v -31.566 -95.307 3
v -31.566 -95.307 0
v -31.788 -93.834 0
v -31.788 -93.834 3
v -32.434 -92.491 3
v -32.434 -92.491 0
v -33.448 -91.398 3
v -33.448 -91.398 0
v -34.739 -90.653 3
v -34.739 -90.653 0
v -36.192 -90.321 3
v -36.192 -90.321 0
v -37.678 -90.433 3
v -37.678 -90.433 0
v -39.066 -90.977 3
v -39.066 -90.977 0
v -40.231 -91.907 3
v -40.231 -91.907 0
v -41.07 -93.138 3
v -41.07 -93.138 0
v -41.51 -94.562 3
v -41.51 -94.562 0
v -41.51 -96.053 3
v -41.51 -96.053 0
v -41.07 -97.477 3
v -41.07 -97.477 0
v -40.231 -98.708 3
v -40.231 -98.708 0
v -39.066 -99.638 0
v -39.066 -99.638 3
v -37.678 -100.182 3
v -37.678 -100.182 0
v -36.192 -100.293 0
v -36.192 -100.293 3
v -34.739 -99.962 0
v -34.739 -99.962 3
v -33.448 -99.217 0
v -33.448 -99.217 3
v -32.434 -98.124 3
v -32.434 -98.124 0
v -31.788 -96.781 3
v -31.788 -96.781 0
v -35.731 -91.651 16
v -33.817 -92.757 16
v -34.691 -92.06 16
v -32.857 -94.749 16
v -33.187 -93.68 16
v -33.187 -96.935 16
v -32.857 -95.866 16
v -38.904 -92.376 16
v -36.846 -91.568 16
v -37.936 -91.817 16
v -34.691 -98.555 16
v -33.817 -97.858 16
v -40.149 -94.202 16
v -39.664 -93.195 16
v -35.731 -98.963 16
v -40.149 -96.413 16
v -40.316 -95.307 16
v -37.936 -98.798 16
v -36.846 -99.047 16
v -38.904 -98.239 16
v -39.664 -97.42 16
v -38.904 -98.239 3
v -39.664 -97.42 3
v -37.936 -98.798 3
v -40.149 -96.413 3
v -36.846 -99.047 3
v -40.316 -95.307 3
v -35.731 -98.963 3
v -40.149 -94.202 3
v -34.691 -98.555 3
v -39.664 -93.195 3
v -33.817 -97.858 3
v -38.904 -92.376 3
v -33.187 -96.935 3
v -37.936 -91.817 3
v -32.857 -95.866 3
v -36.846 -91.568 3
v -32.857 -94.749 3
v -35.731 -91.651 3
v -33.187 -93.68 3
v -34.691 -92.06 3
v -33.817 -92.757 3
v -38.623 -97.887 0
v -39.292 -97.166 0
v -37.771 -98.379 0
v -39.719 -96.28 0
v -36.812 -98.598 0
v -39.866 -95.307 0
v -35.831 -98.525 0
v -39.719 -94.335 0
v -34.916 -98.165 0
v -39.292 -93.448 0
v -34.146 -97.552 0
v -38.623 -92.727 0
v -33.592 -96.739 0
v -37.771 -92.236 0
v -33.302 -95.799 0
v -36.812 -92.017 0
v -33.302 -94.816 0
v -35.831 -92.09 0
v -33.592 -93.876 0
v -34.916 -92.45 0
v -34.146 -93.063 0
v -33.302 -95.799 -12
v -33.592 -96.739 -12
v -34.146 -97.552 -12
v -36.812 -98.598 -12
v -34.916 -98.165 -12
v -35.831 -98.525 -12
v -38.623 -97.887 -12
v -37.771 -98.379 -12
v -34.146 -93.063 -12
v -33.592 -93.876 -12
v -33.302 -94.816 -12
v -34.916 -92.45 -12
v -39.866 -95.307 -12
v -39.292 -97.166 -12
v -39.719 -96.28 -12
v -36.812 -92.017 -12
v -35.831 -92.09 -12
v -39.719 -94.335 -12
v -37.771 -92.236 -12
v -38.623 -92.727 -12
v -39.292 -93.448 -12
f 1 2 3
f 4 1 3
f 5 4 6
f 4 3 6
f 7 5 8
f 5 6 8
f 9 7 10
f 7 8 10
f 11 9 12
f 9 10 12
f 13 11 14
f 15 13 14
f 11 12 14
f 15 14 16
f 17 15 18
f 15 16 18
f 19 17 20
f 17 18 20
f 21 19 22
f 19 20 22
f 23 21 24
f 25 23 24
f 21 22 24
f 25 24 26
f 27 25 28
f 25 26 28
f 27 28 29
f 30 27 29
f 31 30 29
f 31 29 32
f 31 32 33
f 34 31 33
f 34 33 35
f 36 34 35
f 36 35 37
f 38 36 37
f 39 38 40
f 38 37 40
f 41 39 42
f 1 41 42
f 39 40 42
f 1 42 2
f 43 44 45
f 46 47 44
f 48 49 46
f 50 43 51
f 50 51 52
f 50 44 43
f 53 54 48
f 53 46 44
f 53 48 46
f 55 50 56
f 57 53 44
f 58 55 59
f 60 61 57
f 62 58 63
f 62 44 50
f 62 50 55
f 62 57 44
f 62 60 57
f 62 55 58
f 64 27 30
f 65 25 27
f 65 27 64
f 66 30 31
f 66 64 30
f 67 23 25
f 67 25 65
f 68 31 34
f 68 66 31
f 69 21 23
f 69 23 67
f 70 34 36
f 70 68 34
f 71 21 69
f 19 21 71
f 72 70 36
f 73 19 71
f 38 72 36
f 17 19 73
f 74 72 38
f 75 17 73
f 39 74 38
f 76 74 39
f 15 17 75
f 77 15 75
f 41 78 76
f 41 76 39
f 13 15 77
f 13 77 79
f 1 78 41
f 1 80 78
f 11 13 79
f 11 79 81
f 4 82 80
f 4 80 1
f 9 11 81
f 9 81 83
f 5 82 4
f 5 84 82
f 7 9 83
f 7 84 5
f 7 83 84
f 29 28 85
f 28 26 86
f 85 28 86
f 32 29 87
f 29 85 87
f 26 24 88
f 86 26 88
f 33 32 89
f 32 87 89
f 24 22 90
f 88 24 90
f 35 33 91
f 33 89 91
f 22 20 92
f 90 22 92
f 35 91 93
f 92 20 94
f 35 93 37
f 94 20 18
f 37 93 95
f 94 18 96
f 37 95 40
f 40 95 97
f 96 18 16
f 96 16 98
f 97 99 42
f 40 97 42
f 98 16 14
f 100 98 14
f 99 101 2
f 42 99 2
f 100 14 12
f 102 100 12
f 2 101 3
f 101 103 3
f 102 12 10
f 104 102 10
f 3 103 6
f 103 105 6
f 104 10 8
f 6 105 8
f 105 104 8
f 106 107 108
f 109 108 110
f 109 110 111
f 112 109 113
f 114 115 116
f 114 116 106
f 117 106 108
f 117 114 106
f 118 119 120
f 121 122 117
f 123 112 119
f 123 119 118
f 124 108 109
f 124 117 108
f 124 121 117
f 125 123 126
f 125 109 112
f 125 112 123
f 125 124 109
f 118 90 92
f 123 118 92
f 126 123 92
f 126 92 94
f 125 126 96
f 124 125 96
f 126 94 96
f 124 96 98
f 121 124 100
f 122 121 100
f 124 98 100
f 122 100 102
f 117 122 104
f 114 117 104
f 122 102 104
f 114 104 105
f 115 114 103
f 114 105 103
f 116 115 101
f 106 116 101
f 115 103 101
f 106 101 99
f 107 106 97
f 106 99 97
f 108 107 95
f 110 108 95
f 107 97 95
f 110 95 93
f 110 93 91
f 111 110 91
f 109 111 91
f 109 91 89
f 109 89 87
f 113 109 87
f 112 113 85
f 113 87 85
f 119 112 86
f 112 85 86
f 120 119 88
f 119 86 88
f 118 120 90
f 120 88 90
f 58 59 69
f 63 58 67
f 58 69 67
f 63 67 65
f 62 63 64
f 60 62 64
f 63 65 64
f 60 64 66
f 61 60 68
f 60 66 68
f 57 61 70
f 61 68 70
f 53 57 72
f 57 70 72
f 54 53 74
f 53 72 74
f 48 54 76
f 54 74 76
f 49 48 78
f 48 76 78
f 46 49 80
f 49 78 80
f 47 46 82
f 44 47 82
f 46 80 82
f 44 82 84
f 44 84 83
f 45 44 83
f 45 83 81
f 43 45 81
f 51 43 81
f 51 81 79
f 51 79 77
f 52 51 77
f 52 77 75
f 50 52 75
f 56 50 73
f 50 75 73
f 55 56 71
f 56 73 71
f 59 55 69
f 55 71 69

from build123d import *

# Parameters (mm, degrees)
SKETCH_1_R      = 5
EXTRUDE_1_DEPTH = 3
SKETCH_2_R      = 3.3
EXTRUDE_2_DEPTH = 12
SKETCH_4_R      = 3.75
EXTRUDE_3_DEPTH = 13


with BuildPart() as part:
    # 草圖1 → 填料-伸長1 (new body)
    with BuildSketch(Plane.XY):
        with Locations((-36.565519845, -95.307444045)):
            Circle(SKETCH_1_R)
    extrude(amount=EXTRUDE_1_DEPTH)

    # 草圖2 → 填料-伸長2 (add)
    with BuildSketch(Plane(origin=(0, 0, 0), x_dir=(-1, 0, 0), z_dir=(0, 0, -1))):
        with Locations((36.565519845, -95.307444045)):
            Circle(SKETCH_2_R)
    extrude(amount=EXTRUDE_2_DEPTH)

    # 草圖4 → 填料-伸長3 (add)
    with BuildSketch(Plane.XY.offset(3)):
        with Locations(Location((-36.565519845, -95.307444045, 0), (0, 0, 180))):
            Circle(SKETCH_4_R)
    extrude(amount=EXTRUDE_3_DEPTH)


solid = part.part
